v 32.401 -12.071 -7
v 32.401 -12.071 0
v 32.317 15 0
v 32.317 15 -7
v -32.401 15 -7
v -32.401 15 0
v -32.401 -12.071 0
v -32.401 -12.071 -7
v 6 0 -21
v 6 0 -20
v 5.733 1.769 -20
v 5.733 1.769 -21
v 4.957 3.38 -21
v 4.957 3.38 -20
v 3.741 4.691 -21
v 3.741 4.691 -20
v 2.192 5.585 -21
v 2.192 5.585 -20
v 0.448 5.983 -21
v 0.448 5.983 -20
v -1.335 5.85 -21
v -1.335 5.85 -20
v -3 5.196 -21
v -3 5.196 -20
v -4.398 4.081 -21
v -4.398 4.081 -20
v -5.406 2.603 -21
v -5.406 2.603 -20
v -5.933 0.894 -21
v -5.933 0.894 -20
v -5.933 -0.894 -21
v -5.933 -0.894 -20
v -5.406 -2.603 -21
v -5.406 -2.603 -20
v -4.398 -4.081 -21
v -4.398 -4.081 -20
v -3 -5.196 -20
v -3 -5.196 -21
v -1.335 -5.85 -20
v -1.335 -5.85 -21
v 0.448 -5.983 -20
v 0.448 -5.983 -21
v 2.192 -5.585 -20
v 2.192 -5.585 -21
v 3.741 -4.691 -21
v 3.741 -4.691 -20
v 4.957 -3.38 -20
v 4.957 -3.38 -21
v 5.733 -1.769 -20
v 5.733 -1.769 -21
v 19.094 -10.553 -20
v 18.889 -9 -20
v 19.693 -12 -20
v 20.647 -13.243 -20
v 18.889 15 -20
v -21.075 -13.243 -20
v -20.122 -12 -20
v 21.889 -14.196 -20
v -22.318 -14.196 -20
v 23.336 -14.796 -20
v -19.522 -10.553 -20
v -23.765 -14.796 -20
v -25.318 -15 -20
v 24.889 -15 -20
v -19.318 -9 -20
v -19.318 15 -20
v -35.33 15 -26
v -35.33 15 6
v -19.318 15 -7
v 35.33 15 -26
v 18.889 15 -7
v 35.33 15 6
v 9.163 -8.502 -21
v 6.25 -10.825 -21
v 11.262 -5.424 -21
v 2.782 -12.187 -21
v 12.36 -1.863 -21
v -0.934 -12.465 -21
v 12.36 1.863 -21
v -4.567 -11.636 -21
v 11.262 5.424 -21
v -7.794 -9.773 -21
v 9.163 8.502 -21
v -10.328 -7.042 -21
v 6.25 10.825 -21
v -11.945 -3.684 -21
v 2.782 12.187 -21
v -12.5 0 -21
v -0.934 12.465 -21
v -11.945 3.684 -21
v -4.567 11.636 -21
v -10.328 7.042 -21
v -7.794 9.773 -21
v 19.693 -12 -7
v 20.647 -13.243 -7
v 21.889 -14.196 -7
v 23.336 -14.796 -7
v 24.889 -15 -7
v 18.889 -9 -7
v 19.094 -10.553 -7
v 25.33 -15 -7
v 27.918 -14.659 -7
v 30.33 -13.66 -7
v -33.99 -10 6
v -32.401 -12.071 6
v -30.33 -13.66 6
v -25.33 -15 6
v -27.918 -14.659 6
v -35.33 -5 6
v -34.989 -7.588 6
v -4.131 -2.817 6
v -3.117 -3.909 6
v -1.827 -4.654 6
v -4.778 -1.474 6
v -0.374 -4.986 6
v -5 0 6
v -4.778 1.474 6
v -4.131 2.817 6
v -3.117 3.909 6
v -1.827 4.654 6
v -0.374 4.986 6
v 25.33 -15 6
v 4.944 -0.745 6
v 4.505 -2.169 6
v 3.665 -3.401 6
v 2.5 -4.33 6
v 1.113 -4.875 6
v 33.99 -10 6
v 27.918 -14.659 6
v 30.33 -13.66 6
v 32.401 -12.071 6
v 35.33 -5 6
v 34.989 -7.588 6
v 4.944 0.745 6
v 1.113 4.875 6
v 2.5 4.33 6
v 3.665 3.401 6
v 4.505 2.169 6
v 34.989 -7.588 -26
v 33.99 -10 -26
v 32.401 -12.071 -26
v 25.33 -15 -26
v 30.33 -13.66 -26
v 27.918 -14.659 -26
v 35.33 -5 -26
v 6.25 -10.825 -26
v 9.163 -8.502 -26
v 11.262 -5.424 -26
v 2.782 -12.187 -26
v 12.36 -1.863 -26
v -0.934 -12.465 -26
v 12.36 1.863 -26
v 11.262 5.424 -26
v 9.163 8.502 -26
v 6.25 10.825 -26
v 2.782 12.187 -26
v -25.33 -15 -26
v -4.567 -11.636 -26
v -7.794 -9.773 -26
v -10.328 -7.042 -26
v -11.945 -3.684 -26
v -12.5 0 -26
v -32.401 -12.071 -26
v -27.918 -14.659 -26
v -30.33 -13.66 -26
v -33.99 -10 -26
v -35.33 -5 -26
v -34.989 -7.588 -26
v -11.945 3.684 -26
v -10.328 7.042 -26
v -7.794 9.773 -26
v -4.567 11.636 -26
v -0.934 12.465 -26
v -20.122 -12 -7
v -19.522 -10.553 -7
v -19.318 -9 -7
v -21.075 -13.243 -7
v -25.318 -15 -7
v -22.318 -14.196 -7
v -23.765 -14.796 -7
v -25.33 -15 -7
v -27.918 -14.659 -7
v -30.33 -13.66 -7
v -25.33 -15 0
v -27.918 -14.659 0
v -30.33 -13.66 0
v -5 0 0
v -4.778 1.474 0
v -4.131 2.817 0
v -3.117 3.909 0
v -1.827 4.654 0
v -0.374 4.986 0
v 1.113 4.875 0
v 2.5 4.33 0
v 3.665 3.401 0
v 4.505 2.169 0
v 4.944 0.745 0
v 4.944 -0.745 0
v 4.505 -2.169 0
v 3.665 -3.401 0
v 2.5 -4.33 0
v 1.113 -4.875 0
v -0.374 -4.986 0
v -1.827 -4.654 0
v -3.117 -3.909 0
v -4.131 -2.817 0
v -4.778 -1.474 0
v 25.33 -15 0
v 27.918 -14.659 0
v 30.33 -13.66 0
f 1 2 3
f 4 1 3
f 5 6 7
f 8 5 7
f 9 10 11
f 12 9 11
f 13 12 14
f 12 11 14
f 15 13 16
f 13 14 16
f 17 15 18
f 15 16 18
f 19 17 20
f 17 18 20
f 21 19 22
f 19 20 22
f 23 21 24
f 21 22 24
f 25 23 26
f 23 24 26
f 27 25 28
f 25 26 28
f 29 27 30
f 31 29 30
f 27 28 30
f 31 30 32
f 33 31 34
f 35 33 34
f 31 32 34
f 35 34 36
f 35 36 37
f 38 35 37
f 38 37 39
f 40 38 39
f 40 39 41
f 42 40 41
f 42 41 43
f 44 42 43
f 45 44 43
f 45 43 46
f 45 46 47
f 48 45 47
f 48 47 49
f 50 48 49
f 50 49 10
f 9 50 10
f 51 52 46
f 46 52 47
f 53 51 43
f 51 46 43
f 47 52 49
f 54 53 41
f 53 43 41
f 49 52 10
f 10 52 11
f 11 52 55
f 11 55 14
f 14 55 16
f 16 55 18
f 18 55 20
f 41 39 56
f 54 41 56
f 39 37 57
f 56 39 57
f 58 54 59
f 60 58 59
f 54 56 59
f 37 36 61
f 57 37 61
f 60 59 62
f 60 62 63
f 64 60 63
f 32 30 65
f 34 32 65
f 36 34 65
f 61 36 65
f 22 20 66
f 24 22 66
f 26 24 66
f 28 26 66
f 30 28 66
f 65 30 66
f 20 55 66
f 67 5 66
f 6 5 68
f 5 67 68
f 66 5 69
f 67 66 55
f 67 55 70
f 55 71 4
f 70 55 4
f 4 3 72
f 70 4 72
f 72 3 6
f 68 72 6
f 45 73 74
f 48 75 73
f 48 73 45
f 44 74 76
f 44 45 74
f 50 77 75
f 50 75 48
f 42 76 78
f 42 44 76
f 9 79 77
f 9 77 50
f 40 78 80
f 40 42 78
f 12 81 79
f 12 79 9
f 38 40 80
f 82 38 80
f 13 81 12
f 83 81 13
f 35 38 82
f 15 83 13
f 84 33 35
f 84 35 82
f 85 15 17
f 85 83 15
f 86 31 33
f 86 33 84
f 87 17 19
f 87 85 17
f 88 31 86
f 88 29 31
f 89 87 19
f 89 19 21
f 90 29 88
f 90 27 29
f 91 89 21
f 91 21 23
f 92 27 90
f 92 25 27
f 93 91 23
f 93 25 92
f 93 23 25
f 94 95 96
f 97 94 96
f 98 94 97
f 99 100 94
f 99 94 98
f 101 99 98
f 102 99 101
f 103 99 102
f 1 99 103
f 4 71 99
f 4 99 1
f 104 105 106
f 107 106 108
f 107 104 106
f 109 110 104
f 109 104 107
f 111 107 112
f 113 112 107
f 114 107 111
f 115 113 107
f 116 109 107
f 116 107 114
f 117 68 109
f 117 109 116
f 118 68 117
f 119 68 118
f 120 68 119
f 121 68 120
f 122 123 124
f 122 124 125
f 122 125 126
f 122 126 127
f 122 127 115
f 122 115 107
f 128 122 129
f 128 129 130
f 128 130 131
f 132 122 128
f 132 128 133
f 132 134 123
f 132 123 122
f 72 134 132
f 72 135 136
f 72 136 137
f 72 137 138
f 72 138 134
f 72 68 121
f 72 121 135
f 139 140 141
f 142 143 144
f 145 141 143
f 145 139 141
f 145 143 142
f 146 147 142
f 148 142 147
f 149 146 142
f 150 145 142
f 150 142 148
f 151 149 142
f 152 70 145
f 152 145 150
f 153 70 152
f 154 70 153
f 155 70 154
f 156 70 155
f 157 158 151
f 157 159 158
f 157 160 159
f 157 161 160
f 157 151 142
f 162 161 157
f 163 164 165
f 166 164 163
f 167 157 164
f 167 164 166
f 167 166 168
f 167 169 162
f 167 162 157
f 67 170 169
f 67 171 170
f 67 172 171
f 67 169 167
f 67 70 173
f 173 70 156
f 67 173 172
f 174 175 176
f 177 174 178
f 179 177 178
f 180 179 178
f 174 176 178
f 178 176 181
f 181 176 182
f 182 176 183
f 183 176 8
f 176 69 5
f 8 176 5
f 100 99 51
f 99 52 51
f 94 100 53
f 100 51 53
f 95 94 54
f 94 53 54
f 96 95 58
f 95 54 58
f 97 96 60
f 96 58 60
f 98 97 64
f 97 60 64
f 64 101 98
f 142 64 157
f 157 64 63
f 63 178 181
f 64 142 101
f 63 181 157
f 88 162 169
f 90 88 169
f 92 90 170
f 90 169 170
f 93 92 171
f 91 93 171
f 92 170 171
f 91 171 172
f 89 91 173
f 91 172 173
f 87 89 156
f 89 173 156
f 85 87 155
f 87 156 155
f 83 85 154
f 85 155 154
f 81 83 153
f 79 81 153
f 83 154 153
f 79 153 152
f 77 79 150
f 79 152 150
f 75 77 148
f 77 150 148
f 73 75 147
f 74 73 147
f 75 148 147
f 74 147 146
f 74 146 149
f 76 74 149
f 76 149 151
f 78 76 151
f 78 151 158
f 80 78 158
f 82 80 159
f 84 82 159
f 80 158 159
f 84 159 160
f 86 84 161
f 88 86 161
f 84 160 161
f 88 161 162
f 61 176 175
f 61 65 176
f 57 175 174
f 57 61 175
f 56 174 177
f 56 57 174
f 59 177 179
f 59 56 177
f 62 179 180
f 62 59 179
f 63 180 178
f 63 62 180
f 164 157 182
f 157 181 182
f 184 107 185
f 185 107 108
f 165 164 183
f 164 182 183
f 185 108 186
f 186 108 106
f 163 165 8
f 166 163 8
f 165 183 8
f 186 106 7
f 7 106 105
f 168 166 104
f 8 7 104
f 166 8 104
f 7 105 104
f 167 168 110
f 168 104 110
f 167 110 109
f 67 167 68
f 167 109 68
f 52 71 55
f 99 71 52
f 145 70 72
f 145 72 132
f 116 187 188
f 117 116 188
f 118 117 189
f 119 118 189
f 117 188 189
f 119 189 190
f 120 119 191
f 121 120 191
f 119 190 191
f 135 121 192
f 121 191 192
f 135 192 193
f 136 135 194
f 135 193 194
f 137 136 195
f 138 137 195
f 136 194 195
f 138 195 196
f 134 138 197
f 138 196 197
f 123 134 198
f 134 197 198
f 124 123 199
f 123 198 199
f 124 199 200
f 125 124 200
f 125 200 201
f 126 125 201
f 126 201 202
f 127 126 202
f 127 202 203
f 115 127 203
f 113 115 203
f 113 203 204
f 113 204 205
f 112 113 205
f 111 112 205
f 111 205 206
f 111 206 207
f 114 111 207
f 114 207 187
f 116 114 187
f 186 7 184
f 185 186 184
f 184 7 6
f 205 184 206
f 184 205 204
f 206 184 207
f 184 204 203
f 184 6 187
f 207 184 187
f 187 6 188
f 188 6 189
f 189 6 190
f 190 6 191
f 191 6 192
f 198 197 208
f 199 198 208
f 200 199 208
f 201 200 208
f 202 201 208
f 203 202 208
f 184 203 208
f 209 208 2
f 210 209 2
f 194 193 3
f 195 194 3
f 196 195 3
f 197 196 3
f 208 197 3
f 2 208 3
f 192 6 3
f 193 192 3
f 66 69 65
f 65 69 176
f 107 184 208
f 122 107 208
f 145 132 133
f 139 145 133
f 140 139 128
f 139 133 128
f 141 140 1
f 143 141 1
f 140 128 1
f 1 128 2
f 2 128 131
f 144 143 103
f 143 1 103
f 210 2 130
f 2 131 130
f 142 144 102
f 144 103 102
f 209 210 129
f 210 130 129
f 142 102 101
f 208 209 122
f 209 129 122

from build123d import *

# Parameters (mm, degrees)
SKETCH1_W           = 70.659898478
SKETCH1_H           = 30
BOSS_EXTRUDE1_DEPTH = 6
SKETCH2_R           = 5
CUT_EXTRUDE1_DEPTH  = 10
FILLET1_R           = 10
BOSS_EXTRUDE2_DEPTH = 7
BOSS_EXTRUDE3_DEPTH = 13
FILLET2_R           = 6
BOSS_EXTRUDE4_DEPTH = 6
SKETCH8_R           = 6
CUT_EXTRUDE2_DEPTH  = 30
SKETCH9_R           = 12.5
CUT_EXTRUDE3_DEPTH  = 5


with BuildPart() as part:
    # Sketch1 → Boss-Extrude1 (new body)
    with BuildSketch(Plane.XY):
        Rectangle(SKETCH1_W, SKETCH1_H)
    extrude(amount=BOSS_EXTRUDE1_DEPTH)

    # Sketch2 → Cut-Extrude1 (cut)
    with BuildSketch(Plane(origin=(0, 0, 0), x_dir=(-1, 0, 0), z_dir=(0, 0, -1))):
        Circle(SKETCH2_R)
    extrude(amount=-CUT_EXTRUDE1_DEPTH, mode=Mode.SUBTRACT)

    # Fillet1
    fillet1_edges = [part.edges().sort_by_distance(p)[0] for p in [
        (35.329949239, -15, 3),
        (-35.329949239, -15, 3),
    ]]
    fillet(fillet1_edges, radius=FILLET1_R)

    # Sketch4 → Boss-Extrude2 (add)
    with BuildSketch(Plane(origin=(0, 0, 0), x_dir=(-1, 0, 0), z_dir=(0, 0, -1))):
        with BuildLine():
            Line((-32.40101705, -12.071067812), (-32.316998846, 15))
            Line((-32.316998846, 15), (-35.329949239, 15))
            Line((-35.329949239, 15), (-35.329949239, -5))
            ThreePointArc((-35.329949239, -5), (-34.568744564, -8.826834324), (-32.40101705, -12.071067812))
        make_face()
        with BuildLine():
            Line((35.329949239, -5), (35.329949239, 15))
            Line((35.329949239, 15), (32.40101705, 15))
            Line((32.40101705, 15), (32.40101705, -12.071067812))
            ThreePointArc((32.40101705, -12.071067812), (34.568744564, -8.826834324), (35.329949239, -5))
        make_face()
    extrude(amount=BOSS_EXTRUDE2_DEPTH)

    # Sketch6 → Boss-Extrude3 (add)
    with BuildSketch(Plane(origin=(0, 0, -7), x_dir=(-1, 0, 0), z_dir=(0, 0, -1))):
        with BuildLine():
            Line((-18.889389891, 15), (-18.889389891, -15))
            Line((-18.889389891, -15), (-25.329949239, -15))
            ThreePointArc((-25.329949239, -15), (-32.40101705, -12.071067812), (-35.329949239, -5))
            Line((-35.329949239, -5), (-35.329949239, 15))
            Line((-35.329949239, 15), (-18.889389891, 15))
        make_face()
        with BuildLine():
            Line((19.317805732, 15), (19.317805732, -15))
            Line((19.317805732, -15), (25.329949239, -15))
            ThreePointArc((25.329949239, -15), (32.40101705, -12.071067812), (35.329949239, -5))
            Line((35.329949239, -5), (35.329949239, 15))
            Line((35.329949239, 15), (19.317805732, 15))
        make_face()
    extrude(amount=BOSS_EXTRUDE3_DEPTH)

    # Fillet2
    fillet2_edges = [part.edges().sort_by_distance(p)[0] for p in [
        (-19.317805732, -15, -13.5),
        (18.889389891, -15, -13.5),
    ]]
    fillet(fillet2_edges, radius=FILLET2_R)

    # Sketch7 → Boss-Extrude4 (add)
    with BuildSketch(Plane(origin=(0, 0, -20), x_dir=(-1, 0, 0), z_dir=(0, 0, -1))):
        with BuildLine():
            Line((-25.329949239, -15), (25.329949239, -15))
            ThreePointArc((25.329949239, -15), (32.40101705, -12.071067812), (35.329949239, -5))
            Line((35.329949239, -5), (35.329949239, 15))
            Line((35.329949239, 15), (-35.329949239, 15))
            Line((-35.329949239, 15), (-35.329949239, -5))
            ThreePointArc((-35.329949239, -5), (-32.40101705, -12.071067812), (-25.329949239, -15))
        make_face()
    extrude(amount=BOSS_EXTRUDE4_DEPTH)

    # Sketch8 → Cut-Extrude2 (cut)
    with BuildSketch(Plane.XY.offset(-20)):
        Circle(SKETCH8_R)
    extrude(amount=-CUT_EXTRUDE2_DEPTH, mode=Mode.SUBTRACT)

    # Sketch9 → Cut-Extrude3 (cut)
    with BuildSketch(Plane(origin=(0, 0, -26), x_dir=(-1, 0, 0), z_dir=(0, 0, -1))):
        Circle(SKETCH9_R)
    extrude(amount=-CUT_EXTRUDE3_DEPTH, mode=Mode.SUBTRACT)


solid = part.part
